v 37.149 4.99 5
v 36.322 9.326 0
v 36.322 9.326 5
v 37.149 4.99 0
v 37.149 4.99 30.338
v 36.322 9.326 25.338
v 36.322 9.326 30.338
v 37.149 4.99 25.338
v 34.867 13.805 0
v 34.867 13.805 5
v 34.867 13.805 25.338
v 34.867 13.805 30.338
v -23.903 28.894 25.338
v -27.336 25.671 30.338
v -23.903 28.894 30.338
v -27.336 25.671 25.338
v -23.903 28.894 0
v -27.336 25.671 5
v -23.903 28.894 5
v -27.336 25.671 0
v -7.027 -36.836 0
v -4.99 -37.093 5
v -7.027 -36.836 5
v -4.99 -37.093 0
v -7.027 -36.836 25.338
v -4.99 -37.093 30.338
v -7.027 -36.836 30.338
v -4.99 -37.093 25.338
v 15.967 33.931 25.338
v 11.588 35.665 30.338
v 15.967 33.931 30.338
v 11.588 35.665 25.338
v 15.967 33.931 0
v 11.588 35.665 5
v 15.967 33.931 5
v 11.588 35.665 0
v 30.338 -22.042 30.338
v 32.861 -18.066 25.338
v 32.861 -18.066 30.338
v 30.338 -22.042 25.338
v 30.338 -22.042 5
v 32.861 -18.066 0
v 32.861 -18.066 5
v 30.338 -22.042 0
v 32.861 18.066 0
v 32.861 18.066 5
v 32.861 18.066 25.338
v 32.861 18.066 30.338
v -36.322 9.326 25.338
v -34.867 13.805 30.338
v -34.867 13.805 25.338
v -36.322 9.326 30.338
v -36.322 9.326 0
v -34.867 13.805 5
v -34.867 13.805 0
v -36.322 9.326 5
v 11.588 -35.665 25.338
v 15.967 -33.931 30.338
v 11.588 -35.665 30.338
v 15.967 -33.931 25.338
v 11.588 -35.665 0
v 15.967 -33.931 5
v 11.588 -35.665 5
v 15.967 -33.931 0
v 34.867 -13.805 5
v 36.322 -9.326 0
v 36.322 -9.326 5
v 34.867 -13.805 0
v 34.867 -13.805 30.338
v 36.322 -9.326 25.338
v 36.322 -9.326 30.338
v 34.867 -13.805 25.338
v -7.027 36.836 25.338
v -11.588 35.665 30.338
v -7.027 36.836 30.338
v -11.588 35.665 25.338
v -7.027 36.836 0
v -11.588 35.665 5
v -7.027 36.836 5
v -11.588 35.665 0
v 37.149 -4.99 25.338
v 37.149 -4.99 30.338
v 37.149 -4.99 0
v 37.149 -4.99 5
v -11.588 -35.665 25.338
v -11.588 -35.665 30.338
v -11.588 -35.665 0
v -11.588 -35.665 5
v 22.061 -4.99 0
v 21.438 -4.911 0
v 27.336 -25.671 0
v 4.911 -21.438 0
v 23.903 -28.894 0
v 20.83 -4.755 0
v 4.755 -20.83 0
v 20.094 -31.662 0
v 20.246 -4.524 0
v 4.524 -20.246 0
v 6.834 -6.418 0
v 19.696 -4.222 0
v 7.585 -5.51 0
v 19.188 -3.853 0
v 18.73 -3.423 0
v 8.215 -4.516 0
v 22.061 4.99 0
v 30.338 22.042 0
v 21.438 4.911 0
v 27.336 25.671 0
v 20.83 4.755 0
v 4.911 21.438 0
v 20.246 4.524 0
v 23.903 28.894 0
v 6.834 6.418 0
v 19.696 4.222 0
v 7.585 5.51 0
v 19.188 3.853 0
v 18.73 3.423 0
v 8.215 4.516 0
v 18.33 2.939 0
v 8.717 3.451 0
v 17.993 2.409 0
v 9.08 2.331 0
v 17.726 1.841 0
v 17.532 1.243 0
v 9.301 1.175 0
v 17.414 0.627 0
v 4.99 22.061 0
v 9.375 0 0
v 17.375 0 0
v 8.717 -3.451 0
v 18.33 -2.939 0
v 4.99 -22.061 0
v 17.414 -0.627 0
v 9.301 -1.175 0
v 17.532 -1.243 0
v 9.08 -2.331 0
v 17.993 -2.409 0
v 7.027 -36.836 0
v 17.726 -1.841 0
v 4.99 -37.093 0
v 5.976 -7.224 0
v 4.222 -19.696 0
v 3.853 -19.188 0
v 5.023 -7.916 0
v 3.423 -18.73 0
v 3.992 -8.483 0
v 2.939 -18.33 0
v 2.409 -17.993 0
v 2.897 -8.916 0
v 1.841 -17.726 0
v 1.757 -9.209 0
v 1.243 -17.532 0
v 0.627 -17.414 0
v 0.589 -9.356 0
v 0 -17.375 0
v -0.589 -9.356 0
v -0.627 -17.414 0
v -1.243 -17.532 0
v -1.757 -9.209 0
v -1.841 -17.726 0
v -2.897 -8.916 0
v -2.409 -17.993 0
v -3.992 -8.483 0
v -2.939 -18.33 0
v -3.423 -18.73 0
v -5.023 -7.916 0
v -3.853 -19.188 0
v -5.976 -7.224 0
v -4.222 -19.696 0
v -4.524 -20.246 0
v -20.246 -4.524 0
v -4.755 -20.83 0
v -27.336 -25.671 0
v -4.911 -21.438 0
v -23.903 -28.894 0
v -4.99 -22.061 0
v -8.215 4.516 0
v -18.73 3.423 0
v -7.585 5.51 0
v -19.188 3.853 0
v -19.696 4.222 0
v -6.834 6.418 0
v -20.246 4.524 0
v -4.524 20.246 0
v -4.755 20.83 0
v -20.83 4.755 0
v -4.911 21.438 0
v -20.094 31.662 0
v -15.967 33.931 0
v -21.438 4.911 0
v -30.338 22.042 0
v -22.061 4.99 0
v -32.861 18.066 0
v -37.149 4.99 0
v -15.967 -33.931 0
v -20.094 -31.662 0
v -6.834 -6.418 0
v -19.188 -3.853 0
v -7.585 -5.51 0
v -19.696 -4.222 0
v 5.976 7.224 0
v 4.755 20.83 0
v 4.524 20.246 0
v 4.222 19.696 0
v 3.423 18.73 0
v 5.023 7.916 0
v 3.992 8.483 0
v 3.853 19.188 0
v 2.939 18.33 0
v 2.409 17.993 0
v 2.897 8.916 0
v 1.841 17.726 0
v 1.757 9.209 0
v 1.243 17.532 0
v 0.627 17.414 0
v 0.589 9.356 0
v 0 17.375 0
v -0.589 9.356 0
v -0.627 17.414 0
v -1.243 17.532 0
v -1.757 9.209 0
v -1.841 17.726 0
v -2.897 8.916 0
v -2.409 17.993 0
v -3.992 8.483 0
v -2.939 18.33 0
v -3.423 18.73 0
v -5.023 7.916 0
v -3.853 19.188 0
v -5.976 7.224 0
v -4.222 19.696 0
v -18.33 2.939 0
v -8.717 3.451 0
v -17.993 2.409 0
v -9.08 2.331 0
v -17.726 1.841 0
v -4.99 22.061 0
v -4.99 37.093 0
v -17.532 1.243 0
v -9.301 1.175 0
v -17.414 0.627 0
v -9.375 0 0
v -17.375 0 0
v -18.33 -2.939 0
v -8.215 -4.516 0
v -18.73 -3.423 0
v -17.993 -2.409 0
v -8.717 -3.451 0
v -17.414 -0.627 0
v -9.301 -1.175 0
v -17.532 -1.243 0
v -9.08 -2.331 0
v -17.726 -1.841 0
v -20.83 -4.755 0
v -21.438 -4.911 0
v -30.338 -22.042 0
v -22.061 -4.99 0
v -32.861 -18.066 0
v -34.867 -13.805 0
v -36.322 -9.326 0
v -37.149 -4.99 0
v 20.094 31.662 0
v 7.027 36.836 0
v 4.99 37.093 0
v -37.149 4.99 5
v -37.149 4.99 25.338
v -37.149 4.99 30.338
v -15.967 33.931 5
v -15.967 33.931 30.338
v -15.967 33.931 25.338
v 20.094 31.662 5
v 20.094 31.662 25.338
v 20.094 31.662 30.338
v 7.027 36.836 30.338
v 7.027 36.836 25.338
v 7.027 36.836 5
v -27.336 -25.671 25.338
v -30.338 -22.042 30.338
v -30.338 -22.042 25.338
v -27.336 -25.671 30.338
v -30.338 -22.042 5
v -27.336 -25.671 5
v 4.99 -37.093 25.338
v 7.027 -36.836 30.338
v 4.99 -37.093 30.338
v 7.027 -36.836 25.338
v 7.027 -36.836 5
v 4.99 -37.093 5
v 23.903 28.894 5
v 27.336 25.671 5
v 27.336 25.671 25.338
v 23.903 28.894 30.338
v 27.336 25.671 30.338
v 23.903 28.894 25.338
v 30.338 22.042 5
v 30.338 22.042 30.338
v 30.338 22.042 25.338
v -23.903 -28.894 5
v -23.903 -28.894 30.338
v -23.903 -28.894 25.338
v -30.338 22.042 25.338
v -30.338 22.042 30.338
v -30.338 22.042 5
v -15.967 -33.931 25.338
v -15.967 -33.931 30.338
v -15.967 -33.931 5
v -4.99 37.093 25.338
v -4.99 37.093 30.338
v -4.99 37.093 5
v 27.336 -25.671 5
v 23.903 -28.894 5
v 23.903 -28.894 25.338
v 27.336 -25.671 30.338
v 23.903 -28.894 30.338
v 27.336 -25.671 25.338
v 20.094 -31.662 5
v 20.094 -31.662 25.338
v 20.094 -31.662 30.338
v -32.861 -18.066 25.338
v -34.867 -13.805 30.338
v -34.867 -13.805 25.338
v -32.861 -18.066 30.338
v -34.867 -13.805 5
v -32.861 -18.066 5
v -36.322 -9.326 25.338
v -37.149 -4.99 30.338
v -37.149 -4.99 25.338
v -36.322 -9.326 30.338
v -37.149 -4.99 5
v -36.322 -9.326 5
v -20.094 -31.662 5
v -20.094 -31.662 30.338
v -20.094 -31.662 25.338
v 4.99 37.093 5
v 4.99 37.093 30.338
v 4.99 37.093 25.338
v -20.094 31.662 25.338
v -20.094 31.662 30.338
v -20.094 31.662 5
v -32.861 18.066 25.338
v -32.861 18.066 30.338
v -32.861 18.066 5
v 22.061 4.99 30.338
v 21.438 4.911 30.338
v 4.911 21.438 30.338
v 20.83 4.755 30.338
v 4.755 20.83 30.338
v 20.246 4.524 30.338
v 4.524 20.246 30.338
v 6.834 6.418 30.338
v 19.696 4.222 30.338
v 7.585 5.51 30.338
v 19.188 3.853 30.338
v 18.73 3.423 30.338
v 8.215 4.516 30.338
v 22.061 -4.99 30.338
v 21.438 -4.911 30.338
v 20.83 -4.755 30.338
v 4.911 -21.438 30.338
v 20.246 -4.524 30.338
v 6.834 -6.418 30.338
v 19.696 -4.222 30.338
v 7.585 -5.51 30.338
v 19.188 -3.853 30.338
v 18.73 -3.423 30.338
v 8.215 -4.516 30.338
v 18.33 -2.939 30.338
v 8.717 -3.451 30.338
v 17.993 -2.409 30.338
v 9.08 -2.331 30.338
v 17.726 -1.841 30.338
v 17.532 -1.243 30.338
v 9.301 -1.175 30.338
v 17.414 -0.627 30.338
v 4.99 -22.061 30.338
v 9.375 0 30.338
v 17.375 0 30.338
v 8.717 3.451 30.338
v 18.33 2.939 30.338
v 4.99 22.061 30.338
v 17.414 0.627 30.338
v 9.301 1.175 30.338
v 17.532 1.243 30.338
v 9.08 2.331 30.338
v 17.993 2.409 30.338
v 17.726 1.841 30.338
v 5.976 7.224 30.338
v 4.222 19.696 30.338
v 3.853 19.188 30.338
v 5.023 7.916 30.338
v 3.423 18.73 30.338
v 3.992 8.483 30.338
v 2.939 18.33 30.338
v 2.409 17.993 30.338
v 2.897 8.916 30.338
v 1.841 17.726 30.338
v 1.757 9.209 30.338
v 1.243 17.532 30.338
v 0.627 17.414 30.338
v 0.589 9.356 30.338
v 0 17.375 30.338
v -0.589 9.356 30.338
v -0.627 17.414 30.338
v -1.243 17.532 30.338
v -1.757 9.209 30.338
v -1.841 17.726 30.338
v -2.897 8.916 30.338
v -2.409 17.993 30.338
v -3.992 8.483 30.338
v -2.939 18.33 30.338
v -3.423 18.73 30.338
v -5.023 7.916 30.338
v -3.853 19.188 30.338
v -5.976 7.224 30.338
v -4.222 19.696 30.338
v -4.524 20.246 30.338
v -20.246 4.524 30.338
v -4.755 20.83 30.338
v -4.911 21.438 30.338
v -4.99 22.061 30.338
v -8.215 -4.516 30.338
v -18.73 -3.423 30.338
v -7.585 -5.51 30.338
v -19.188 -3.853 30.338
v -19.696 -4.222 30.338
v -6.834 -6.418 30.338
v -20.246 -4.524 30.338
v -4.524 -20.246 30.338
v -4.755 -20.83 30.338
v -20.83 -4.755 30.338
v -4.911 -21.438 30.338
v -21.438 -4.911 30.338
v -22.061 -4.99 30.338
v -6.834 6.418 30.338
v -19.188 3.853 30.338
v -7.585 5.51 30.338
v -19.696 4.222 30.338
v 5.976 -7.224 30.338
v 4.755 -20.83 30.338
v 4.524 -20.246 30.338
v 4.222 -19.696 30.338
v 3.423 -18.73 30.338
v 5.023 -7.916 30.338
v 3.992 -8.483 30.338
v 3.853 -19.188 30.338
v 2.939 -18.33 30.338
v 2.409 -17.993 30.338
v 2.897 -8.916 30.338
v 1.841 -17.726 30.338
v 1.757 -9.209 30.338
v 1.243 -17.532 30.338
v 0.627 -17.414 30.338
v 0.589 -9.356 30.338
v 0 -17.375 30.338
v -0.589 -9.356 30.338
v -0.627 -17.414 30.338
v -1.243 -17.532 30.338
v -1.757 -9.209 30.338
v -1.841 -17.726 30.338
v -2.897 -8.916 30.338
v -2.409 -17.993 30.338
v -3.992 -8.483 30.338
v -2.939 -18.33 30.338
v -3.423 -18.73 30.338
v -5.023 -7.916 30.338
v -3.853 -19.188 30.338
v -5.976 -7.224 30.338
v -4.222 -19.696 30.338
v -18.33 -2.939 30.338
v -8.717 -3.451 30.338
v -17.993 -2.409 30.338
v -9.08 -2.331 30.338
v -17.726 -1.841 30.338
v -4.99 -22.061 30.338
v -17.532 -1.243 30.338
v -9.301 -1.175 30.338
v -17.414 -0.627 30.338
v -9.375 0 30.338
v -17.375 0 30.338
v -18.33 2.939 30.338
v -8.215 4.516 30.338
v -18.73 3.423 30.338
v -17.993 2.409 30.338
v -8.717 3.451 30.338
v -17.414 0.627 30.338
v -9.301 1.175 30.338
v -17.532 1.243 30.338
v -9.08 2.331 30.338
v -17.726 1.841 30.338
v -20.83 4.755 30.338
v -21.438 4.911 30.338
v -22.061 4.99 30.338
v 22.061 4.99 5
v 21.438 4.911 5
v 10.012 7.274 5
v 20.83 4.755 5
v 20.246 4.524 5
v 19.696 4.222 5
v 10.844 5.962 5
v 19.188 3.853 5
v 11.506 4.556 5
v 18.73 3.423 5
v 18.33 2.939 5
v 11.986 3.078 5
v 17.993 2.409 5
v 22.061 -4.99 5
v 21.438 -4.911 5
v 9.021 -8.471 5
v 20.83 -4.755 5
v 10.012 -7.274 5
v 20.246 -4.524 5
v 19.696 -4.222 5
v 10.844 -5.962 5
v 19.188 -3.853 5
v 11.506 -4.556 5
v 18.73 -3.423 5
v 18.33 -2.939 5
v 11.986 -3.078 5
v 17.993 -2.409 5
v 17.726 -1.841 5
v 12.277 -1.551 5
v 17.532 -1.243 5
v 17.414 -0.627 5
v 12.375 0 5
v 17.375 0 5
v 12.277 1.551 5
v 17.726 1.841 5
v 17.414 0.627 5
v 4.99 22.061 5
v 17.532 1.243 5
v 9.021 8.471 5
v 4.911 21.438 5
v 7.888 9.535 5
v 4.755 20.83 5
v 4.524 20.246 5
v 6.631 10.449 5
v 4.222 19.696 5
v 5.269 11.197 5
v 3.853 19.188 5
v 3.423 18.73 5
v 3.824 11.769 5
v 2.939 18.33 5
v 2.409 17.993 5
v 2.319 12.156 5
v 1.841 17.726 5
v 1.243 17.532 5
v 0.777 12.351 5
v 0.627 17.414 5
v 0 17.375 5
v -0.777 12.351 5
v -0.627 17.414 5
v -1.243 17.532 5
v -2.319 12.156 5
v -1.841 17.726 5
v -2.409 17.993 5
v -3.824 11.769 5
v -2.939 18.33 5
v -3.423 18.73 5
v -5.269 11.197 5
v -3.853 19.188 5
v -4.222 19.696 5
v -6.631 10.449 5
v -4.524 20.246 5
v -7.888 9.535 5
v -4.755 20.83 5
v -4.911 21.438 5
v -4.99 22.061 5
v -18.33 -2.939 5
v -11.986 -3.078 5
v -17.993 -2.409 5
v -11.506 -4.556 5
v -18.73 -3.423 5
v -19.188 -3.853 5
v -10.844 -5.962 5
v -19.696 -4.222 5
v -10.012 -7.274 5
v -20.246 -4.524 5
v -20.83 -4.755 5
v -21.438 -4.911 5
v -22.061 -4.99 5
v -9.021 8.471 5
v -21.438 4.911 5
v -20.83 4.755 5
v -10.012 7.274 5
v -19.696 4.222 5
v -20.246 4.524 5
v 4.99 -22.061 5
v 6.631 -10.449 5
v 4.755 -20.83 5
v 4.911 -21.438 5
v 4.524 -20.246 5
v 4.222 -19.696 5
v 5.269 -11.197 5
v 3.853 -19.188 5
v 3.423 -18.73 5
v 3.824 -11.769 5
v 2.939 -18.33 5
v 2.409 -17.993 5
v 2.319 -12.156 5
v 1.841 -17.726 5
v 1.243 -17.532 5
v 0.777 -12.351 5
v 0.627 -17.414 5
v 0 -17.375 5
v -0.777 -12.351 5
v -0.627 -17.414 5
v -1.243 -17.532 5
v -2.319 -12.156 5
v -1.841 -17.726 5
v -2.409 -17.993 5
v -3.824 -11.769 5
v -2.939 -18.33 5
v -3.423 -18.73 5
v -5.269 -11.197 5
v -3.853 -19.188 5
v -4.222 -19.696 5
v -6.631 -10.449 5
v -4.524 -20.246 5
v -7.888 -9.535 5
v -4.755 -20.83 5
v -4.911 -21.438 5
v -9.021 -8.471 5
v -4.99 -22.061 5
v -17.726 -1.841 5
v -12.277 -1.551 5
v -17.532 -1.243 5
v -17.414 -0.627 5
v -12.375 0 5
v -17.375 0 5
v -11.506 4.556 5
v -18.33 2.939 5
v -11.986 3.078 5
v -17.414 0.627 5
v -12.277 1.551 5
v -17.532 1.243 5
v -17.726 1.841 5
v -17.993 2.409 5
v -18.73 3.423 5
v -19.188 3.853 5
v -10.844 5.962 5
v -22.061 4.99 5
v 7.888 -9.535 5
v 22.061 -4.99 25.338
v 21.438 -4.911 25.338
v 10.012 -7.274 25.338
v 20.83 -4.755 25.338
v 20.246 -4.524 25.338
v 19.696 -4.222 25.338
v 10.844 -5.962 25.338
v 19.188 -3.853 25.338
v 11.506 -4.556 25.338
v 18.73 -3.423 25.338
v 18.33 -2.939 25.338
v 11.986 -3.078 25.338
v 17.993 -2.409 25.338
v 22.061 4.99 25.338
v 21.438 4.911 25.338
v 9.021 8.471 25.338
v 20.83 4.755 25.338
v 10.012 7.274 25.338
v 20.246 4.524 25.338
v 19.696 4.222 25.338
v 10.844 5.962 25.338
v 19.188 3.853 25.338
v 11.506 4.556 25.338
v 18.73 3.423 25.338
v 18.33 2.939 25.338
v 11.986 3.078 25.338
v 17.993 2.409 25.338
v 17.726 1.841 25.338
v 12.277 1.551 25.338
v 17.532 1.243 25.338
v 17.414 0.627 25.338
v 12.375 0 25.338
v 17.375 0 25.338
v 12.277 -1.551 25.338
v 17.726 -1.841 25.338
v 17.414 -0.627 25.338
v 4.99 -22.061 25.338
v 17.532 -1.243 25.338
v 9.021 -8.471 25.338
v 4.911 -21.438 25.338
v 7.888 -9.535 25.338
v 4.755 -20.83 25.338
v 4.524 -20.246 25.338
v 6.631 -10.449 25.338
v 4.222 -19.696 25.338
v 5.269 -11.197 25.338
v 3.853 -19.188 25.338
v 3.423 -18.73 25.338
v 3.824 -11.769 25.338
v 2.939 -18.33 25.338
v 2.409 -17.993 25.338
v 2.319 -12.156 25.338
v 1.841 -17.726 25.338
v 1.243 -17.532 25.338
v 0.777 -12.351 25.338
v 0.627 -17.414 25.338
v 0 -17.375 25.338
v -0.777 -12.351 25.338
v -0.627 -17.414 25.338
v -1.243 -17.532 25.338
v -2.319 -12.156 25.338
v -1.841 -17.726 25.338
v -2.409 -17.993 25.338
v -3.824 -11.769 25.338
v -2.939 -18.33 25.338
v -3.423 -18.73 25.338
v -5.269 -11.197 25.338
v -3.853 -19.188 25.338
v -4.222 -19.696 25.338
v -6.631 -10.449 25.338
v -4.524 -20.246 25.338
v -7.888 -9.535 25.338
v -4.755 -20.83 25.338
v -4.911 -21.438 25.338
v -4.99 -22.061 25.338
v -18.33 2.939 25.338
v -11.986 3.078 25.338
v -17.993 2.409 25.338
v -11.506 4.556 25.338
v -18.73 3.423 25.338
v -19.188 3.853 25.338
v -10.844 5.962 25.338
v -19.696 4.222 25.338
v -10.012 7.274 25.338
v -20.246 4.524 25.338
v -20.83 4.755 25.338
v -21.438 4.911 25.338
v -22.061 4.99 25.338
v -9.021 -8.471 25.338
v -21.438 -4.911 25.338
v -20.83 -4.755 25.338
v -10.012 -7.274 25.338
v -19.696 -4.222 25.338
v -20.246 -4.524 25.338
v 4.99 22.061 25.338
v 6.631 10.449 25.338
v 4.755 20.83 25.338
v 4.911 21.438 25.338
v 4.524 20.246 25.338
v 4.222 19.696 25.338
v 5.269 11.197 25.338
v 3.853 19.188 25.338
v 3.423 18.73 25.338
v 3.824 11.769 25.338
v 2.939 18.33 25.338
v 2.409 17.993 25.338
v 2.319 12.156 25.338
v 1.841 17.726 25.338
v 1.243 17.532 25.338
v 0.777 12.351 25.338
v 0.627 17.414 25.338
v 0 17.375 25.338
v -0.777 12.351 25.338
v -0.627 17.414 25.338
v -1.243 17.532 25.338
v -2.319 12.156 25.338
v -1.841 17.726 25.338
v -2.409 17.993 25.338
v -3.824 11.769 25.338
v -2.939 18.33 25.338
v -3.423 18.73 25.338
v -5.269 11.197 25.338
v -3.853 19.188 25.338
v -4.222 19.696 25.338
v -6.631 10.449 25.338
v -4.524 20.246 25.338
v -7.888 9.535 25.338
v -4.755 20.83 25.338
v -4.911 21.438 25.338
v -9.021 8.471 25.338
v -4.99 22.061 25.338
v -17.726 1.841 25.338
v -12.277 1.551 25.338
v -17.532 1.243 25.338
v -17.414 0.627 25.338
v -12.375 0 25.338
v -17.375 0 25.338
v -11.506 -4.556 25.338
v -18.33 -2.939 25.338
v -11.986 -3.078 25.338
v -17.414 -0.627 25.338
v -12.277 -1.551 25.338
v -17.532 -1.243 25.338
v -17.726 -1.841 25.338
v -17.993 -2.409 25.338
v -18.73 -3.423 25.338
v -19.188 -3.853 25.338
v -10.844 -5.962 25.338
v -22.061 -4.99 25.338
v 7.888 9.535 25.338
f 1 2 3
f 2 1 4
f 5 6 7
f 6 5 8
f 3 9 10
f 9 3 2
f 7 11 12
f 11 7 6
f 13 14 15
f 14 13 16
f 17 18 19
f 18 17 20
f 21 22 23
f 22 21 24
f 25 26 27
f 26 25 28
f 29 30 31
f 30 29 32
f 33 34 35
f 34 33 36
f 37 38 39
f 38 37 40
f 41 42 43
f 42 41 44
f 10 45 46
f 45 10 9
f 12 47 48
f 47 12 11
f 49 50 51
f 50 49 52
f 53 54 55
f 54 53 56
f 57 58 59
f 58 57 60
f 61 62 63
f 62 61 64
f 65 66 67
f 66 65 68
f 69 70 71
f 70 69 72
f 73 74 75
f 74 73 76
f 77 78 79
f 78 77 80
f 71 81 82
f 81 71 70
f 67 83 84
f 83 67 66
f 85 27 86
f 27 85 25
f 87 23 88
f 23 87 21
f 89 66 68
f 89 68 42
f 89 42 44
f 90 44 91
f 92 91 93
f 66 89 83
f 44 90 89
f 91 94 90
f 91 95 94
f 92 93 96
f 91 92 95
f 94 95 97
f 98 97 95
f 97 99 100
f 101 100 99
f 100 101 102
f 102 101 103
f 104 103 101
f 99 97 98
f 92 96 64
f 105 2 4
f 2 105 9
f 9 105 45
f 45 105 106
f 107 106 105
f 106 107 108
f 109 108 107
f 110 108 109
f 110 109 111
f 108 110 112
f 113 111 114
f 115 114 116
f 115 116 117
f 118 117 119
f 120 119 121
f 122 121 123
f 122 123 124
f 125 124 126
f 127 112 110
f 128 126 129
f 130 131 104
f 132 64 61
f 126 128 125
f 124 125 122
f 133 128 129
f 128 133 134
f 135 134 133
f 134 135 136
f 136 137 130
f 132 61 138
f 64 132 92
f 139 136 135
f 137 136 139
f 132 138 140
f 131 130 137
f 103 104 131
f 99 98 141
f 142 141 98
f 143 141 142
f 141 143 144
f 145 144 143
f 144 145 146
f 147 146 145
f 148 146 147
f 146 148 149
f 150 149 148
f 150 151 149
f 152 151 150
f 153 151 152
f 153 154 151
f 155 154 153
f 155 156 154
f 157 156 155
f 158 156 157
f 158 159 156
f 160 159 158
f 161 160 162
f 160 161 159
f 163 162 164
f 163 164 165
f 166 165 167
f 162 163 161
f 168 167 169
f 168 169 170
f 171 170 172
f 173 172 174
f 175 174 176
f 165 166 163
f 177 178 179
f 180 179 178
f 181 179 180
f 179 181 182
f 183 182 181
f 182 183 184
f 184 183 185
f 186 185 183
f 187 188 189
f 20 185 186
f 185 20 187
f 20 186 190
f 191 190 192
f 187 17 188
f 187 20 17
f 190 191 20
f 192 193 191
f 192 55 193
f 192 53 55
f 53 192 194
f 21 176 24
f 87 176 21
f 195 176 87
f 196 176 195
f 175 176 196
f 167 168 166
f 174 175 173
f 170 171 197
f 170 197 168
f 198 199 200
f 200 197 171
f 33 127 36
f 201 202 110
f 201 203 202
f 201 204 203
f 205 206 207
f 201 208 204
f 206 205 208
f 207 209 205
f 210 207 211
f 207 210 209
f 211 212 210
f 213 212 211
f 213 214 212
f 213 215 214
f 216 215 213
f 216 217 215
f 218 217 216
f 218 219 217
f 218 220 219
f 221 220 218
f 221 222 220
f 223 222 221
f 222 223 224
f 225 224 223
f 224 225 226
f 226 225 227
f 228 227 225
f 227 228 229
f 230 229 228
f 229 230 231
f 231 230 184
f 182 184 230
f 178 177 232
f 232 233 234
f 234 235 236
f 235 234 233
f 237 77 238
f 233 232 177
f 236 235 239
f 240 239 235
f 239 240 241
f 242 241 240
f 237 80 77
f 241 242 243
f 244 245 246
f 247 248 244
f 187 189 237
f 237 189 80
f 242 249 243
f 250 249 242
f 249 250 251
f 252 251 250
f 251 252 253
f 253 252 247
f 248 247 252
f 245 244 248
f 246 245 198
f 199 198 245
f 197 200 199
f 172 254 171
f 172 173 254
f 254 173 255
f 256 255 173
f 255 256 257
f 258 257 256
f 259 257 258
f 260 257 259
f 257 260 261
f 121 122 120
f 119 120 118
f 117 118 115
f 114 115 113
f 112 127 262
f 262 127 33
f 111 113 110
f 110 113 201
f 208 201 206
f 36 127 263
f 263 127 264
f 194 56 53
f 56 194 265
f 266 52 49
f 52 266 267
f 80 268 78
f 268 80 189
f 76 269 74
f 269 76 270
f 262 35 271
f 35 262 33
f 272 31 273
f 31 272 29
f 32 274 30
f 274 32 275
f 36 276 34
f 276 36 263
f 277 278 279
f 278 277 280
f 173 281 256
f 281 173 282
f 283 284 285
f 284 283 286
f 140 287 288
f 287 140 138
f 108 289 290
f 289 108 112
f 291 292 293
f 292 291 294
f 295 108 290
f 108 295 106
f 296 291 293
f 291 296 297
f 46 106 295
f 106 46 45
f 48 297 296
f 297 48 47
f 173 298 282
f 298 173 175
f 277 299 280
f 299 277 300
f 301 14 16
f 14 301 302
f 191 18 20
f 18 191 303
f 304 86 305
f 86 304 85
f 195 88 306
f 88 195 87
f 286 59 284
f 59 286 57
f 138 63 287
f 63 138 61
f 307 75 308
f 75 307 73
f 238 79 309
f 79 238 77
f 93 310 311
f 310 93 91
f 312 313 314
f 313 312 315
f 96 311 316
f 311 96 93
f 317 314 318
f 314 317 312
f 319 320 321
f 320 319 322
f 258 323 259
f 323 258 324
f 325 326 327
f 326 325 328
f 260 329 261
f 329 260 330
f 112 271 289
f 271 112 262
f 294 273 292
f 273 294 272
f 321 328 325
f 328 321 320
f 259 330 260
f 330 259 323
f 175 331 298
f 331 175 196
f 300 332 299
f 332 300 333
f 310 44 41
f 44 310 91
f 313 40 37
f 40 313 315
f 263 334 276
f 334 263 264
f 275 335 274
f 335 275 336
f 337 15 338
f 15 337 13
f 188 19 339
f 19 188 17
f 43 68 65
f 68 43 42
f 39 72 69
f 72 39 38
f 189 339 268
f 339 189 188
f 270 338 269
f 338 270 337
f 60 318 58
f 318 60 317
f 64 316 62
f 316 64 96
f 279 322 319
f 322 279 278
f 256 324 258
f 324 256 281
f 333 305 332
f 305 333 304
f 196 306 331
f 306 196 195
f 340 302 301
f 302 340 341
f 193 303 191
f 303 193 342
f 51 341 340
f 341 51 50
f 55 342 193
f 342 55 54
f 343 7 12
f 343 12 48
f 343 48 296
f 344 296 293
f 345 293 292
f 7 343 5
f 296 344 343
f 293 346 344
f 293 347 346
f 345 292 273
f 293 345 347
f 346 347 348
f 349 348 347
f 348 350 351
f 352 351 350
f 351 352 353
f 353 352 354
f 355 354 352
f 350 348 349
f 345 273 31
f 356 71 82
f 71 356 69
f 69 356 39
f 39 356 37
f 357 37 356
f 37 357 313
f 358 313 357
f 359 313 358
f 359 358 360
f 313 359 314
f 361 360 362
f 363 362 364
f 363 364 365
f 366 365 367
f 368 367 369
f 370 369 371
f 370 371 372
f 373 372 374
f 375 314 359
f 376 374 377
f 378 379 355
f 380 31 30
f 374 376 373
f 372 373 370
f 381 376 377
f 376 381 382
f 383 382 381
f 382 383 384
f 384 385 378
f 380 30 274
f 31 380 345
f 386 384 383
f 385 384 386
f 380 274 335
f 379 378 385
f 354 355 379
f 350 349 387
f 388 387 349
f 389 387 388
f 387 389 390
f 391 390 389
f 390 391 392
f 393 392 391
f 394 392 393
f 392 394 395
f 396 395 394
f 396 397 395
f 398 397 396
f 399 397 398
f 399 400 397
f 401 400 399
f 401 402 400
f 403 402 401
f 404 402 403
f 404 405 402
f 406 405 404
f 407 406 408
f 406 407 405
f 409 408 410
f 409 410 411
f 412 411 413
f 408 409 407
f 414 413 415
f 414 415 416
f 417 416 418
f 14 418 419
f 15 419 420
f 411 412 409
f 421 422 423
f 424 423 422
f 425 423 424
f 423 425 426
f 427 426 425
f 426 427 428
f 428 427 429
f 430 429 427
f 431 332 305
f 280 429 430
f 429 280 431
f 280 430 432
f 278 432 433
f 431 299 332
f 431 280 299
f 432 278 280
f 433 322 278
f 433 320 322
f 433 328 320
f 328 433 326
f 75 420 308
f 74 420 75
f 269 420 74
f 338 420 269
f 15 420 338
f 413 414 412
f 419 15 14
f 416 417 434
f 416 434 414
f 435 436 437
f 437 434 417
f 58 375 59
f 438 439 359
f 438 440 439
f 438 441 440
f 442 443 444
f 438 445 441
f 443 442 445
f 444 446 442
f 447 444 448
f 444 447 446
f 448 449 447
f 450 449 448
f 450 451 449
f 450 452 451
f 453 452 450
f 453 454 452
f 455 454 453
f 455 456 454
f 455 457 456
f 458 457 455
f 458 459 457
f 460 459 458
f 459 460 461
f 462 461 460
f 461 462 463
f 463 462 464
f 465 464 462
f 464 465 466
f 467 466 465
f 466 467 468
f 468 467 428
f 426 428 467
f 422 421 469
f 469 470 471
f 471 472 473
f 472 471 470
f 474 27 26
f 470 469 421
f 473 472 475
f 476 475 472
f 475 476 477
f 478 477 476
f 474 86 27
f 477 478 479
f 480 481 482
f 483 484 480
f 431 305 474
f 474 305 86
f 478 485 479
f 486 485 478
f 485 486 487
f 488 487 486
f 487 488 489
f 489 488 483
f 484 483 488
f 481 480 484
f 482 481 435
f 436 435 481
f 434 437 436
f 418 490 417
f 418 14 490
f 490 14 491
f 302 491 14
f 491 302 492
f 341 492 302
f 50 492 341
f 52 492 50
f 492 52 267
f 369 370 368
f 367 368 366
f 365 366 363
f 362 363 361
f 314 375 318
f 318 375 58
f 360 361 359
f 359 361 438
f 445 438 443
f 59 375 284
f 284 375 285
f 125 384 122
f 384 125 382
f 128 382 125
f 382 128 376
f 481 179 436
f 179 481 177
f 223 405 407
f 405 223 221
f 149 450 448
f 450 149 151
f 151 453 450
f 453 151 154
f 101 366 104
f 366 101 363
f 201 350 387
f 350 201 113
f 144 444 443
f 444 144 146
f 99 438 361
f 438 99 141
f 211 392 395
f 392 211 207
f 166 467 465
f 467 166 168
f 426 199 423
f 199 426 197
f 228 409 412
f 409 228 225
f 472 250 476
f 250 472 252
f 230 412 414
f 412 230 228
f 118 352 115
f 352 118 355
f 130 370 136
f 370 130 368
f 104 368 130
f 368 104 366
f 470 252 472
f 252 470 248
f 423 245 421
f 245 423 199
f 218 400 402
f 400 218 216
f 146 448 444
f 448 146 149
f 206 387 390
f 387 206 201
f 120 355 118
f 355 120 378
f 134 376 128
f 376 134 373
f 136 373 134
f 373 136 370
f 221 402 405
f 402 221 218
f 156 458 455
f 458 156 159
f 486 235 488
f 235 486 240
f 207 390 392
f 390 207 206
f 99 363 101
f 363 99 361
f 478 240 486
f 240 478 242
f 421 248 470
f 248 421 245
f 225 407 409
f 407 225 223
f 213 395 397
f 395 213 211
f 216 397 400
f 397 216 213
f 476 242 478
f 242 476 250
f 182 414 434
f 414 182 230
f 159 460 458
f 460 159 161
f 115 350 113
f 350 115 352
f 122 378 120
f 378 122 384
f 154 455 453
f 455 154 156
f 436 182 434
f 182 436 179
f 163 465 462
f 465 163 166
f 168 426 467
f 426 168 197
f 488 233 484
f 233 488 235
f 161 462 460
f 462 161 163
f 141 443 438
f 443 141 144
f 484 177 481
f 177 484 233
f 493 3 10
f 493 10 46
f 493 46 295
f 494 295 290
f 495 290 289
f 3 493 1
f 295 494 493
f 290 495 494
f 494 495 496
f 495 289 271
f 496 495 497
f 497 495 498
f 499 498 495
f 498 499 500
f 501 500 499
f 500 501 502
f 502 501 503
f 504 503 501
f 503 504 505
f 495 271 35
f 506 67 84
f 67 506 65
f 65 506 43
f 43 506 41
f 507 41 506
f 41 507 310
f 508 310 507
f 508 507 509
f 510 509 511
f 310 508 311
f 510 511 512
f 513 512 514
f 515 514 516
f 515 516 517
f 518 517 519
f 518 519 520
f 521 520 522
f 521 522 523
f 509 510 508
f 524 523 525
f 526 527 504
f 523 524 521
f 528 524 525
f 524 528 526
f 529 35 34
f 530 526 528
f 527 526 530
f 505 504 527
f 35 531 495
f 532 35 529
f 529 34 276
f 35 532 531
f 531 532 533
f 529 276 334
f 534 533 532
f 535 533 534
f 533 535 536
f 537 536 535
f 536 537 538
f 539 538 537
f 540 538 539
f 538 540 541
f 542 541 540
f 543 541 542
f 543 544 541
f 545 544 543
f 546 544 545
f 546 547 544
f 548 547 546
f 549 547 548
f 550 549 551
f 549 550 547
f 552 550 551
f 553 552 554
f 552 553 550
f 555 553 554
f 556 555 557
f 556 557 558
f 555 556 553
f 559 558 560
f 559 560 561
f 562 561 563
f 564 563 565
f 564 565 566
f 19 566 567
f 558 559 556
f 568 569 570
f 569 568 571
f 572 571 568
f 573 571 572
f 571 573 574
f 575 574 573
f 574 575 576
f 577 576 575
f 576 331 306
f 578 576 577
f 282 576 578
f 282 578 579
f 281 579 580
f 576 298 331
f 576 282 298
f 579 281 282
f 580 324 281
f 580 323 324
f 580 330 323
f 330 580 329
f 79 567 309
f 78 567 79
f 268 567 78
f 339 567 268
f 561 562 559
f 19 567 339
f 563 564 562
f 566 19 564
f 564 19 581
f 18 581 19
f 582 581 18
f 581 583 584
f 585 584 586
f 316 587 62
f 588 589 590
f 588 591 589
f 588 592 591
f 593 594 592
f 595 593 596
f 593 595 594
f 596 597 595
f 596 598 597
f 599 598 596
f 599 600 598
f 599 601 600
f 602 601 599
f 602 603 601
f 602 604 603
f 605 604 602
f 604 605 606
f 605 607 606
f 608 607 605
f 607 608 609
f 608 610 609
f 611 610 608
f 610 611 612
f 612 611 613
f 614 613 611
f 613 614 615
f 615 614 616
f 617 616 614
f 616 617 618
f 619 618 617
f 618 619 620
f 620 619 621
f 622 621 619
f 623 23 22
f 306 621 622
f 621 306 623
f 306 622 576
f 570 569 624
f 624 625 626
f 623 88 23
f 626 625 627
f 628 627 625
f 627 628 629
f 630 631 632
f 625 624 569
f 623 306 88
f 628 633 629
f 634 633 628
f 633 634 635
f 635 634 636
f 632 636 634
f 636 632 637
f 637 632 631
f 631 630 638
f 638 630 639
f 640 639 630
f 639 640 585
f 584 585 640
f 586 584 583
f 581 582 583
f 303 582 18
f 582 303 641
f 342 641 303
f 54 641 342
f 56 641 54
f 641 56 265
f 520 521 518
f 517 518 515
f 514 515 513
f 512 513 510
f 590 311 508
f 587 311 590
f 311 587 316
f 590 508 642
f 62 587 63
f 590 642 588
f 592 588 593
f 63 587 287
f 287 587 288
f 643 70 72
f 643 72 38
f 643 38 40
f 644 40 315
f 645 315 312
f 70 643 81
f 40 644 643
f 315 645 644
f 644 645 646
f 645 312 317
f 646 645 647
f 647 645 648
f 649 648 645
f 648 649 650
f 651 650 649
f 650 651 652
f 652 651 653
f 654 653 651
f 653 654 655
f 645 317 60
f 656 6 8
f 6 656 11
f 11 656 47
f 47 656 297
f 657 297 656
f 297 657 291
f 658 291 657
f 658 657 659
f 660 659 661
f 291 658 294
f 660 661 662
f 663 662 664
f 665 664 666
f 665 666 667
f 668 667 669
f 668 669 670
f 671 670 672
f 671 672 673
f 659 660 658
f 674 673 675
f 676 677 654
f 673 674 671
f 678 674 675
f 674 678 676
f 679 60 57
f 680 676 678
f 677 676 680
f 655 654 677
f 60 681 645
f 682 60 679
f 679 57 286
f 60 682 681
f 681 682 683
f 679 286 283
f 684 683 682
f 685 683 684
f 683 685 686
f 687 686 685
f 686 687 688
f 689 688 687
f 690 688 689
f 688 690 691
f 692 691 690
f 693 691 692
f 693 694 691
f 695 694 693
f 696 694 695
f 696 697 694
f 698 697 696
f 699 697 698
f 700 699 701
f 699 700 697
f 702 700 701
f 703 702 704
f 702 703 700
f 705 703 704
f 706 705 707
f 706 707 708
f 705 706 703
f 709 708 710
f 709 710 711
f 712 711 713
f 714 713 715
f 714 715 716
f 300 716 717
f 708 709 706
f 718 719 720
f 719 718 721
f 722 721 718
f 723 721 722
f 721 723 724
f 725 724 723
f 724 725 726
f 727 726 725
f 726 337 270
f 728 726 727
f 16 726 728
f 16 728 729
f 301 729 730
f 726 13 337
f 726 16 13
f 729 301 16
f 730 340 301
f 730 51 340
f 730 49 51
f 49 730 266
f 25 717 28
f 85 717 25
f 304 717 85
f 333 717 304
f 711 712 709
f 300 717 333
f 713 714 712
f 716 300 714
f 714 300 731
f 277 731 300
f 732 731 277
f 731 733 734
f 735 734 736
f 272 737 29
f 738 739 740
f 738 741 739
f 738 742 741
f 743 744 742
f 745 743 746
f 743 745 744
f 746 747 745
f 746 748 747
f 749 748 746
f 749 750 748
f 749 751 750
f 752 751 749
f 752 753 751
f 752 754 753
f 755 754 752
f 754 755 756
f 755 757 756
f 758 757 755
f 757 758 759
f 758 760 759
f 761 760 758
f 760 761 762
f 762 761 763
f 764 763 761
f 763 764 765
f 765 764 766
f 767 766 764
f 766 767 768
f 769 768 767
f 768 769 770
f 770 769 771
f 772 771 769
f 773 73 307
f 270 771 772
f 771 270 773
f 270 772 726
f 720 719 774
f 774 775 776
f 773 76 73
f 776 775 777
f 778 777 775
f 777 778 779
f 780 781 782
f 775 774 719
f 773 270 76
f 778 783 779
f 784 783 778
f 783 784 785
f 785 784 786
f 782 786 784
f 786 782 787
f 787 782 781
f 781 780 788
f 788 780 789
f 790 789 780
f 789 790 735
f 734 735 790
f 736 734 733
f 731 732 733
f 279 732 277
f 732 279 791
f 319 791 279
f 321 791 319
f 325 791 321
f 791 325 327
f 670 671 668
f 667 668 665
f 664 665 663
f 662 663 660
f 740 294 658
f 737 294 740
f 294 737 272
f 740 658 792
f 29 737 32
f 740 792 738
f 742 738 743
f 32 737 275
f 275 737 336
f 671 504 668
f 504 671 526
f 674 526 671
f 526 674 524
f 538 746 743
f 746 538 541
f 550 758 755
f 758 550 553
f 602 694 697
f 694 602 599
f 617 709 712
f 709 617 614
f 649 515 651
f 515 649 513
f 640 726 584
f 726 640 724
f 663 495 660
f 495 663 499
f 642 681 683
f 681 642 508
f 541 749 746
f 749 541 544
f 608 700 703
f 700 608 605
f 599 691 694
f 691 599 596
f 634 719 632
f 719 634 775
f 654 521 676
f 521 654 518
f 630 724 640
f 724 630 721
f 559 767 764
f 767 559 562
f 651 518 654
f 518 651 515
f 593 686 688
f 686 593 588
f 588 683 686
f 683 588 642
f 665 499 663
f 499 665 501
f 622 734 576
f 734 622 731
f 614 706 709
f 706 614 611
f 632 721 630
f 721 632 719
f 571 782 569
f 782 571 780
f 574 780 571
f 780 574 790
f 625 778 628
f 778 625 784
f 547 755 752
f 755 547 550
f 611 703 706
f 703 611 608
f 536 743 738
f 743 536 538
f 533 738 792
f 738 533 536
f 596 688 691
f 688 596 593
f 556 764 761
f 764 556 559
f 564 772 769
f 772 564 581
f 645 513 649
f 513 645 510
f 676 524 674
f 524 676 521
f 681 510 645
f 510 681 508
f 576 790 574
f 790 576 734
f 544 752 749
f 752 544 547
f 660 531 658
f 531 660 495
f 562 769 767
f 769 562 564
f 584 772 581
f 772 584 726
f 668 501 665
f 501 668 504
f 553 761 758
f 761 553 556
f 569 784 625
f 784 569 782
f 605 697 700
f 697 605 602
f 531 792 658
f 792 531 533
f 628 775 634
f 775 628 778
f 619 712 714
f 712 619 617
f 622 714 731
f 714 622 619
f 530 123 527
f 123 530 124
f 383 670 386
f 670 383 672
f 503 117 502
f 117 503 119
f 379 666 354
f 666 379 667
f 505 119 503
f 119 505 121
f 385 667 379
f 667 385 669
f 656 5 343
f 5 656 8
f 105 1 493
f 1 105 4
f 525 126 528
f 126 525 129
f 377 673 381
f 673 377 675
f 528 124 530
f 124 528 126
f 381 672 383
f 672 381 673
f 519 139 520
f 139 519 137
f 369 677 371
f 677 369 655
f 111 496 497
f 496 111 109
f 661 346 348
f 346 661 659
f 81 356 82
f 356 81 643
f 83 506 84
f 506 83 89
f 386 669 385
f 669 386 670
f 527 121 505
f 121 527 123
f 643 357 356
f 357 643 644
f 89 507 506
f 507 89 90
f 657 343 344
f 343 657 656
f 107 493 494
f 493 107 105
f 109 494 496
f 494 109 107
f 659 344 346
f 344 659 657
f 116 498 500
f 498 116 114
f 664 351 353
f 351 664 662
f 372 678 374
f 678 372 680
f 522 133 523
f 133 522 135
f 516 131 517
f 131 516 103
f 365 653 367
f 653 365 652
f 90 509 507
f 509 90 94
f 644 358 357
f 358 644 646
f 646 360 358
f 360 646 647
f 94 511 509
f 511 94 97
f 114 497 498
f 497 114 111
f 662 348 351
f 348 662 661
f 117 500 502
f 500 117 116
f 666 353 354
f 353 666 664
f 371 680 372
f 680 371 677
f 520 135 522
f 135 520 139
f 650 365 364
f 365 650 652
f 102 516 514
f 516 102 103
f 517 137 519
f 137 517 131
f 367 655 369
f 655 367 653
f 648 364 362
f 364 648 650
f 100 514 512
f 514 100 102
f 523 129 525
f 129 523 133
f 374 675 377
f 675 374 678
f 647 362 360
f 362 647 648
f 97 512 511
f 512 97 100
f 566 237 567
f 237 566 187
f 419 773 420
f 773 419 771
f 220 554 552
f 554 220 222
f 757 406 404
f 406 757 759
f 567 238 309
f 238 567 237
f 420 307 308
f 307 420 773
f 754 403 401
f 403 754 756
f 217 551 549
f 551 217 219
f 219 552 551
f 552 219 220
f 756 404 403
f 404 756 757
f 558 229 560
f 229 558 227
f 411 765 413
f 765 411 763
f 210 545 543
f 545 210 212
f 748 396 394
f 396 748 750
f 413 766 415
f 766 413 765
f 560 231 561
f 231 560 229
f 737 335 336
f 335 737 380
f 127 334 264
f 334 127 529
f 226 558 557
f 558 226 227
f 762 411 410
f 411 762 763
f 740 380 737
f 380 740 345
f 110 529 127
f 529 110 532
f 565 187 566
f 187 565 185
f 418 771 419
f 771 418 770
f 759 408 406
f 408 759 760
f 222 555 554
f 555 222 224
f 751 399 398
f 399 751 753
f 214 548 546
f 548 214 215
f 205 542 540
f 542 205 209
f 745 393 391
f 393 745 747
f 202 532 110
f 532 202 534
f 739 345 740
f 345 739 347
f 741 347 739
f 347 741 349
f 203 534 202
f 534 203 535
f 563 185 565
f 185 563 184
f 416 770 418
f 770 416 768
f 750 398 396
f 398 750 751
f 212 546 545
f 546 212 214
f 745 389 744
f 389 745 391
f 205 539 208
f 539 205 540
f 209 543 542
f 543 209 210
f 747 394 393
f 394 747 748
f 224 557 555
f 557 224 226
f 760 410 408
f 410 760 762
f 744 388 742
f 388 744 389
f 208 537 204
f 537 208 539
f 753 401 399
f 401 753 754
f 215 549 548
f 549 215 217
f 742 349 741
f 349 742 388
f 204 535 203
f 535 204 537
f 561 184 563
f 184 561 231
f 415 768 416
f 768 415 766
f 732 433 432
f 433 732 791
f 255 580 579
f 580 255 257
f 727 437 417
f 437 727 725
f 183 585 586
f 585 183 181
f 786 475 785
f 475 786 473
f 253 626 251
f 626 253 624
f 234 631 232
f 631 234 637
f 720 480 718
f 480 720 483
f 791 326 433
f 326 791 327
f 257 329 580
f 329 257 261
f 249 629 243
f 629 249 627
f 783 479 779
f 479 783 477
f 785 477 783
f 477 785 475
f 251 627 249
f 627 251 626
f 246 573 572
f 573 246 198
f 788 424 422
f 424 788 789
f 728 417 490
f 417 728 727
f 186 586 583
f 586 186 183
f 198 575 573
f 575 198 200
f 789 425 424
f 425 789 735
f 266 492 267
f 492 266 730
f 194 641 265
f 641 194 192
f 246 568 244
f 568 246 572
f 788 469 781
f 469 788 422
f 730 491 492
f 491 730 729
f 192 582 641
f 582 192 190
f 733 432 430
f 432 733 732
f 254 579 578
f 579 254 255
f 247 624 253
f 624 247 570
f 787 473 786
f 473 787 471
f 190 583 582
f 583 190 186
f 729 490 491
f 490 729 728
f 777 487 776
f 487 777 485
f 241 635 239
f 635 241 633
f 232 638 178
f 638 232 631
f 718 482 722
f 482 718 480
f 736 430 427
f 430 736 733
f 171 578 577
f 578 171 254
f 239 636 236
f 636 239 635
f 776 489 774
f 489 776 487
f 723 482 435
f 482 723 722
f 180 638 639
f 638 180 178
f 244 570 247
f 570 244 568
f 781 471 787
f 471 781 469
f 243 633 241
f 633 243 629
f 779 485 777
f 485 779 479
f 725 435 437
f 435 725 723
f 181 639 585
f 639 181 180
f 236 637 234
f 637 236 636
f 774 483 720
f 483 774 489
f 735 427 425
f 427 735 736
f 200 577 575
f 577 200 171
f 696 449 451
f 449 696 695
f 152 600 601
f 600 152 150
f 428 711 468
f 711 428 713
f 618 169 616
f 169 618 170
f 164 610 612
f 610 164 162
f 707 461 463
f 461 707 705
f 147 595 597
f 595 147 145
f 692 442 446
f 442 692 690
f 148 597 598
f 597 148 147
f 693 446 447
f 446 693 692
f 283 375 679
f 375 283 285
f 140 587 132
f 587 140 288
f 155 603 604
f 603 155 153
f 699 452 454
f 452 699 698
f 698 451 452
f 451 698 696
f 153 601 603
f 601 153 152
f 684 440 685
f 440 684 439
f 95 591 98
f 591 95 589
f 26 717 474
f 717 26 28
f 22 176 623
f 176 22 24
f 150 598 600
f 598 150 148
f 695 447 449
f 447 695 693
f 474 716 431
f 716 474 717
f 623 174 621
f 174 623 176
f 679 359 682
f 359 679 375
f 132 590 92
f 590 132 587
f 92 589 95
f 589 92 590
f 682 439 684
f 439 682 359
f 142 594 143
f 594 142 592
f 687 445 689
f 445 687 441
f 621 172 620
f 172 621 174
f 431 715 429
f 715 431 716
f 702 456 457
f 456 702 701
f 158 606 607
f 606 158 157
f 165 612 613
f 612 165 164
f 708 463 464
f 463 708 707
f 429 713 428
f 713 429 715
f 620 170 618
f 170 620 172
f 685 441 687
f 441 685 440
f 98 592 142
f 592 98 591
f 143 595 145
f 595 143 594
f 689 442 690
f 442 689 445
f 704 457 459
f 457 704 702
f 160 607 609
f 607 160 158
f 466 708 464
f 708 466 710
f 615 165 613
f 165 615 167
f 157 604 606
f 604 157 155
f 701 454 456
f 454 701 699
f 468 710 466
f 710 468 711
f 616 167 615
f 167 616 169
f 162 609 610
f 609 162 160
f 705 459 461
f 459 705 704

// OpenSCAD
$fn = 50;

od = 75;
id = od/4;


spool_wall_thickness=3;
outer_spool_thickness=10;

cable_tie_thickness=10;

cable_tie_offset_from_inner_spool = 10;

part_height = id*1.61803398875;

module ring(inner,outer,height) {
    difference() {
        echo("Making a ring with od of ");
        echo(outer);
        echo(" and an inner diameter of ");
        echo(inner);
        cylinder(r=outer, h=height);
        cylinder(r=inner, h=height);

    }
}



module cable_tie_holes1() {
    echo("cutting inner holes for cable ties");
    for(a = [0:90:359]) {
        rotate([0,0,a])
        {
            translate([id/2+spool_wall_thickness+cable_tie_offset_from_inner_spool,0,0]) {
                hull() {
                    cylinder(r=cable_tie_thickness/2,part_height);
                    translate([cable_tie_thickness,0,0]) cylinder(r=cable_tie_thickness/2,part_height);
                    translate([cable_tie_thickness*2,0,0]) cylinder(r=cable_tie_thickness/2,part_height);
                }
            }
        }
    }
}

module ring1(){
        echo("Creating outside spool primitive");
        ring(id/2,od/2,part_height);
}

module ring2() {
        echo("Creating cut cylinder to hollow out spool");
        translate([0,0,outer_spool_thickness/2]) {
            ring(
                id/2+spool_wall_thickness,
                od*2,
                part_height-outer_spool_thickness);
    }
}

difference() {
    difference(){
        color([1,0,0]) ring1();
        color([0,1,0]) ring2();

    }
    color([0,0,1]) cable_tie_holes1();
}
//color([1,0,0]) ring1();
//color([0,1,0]) ring2();
